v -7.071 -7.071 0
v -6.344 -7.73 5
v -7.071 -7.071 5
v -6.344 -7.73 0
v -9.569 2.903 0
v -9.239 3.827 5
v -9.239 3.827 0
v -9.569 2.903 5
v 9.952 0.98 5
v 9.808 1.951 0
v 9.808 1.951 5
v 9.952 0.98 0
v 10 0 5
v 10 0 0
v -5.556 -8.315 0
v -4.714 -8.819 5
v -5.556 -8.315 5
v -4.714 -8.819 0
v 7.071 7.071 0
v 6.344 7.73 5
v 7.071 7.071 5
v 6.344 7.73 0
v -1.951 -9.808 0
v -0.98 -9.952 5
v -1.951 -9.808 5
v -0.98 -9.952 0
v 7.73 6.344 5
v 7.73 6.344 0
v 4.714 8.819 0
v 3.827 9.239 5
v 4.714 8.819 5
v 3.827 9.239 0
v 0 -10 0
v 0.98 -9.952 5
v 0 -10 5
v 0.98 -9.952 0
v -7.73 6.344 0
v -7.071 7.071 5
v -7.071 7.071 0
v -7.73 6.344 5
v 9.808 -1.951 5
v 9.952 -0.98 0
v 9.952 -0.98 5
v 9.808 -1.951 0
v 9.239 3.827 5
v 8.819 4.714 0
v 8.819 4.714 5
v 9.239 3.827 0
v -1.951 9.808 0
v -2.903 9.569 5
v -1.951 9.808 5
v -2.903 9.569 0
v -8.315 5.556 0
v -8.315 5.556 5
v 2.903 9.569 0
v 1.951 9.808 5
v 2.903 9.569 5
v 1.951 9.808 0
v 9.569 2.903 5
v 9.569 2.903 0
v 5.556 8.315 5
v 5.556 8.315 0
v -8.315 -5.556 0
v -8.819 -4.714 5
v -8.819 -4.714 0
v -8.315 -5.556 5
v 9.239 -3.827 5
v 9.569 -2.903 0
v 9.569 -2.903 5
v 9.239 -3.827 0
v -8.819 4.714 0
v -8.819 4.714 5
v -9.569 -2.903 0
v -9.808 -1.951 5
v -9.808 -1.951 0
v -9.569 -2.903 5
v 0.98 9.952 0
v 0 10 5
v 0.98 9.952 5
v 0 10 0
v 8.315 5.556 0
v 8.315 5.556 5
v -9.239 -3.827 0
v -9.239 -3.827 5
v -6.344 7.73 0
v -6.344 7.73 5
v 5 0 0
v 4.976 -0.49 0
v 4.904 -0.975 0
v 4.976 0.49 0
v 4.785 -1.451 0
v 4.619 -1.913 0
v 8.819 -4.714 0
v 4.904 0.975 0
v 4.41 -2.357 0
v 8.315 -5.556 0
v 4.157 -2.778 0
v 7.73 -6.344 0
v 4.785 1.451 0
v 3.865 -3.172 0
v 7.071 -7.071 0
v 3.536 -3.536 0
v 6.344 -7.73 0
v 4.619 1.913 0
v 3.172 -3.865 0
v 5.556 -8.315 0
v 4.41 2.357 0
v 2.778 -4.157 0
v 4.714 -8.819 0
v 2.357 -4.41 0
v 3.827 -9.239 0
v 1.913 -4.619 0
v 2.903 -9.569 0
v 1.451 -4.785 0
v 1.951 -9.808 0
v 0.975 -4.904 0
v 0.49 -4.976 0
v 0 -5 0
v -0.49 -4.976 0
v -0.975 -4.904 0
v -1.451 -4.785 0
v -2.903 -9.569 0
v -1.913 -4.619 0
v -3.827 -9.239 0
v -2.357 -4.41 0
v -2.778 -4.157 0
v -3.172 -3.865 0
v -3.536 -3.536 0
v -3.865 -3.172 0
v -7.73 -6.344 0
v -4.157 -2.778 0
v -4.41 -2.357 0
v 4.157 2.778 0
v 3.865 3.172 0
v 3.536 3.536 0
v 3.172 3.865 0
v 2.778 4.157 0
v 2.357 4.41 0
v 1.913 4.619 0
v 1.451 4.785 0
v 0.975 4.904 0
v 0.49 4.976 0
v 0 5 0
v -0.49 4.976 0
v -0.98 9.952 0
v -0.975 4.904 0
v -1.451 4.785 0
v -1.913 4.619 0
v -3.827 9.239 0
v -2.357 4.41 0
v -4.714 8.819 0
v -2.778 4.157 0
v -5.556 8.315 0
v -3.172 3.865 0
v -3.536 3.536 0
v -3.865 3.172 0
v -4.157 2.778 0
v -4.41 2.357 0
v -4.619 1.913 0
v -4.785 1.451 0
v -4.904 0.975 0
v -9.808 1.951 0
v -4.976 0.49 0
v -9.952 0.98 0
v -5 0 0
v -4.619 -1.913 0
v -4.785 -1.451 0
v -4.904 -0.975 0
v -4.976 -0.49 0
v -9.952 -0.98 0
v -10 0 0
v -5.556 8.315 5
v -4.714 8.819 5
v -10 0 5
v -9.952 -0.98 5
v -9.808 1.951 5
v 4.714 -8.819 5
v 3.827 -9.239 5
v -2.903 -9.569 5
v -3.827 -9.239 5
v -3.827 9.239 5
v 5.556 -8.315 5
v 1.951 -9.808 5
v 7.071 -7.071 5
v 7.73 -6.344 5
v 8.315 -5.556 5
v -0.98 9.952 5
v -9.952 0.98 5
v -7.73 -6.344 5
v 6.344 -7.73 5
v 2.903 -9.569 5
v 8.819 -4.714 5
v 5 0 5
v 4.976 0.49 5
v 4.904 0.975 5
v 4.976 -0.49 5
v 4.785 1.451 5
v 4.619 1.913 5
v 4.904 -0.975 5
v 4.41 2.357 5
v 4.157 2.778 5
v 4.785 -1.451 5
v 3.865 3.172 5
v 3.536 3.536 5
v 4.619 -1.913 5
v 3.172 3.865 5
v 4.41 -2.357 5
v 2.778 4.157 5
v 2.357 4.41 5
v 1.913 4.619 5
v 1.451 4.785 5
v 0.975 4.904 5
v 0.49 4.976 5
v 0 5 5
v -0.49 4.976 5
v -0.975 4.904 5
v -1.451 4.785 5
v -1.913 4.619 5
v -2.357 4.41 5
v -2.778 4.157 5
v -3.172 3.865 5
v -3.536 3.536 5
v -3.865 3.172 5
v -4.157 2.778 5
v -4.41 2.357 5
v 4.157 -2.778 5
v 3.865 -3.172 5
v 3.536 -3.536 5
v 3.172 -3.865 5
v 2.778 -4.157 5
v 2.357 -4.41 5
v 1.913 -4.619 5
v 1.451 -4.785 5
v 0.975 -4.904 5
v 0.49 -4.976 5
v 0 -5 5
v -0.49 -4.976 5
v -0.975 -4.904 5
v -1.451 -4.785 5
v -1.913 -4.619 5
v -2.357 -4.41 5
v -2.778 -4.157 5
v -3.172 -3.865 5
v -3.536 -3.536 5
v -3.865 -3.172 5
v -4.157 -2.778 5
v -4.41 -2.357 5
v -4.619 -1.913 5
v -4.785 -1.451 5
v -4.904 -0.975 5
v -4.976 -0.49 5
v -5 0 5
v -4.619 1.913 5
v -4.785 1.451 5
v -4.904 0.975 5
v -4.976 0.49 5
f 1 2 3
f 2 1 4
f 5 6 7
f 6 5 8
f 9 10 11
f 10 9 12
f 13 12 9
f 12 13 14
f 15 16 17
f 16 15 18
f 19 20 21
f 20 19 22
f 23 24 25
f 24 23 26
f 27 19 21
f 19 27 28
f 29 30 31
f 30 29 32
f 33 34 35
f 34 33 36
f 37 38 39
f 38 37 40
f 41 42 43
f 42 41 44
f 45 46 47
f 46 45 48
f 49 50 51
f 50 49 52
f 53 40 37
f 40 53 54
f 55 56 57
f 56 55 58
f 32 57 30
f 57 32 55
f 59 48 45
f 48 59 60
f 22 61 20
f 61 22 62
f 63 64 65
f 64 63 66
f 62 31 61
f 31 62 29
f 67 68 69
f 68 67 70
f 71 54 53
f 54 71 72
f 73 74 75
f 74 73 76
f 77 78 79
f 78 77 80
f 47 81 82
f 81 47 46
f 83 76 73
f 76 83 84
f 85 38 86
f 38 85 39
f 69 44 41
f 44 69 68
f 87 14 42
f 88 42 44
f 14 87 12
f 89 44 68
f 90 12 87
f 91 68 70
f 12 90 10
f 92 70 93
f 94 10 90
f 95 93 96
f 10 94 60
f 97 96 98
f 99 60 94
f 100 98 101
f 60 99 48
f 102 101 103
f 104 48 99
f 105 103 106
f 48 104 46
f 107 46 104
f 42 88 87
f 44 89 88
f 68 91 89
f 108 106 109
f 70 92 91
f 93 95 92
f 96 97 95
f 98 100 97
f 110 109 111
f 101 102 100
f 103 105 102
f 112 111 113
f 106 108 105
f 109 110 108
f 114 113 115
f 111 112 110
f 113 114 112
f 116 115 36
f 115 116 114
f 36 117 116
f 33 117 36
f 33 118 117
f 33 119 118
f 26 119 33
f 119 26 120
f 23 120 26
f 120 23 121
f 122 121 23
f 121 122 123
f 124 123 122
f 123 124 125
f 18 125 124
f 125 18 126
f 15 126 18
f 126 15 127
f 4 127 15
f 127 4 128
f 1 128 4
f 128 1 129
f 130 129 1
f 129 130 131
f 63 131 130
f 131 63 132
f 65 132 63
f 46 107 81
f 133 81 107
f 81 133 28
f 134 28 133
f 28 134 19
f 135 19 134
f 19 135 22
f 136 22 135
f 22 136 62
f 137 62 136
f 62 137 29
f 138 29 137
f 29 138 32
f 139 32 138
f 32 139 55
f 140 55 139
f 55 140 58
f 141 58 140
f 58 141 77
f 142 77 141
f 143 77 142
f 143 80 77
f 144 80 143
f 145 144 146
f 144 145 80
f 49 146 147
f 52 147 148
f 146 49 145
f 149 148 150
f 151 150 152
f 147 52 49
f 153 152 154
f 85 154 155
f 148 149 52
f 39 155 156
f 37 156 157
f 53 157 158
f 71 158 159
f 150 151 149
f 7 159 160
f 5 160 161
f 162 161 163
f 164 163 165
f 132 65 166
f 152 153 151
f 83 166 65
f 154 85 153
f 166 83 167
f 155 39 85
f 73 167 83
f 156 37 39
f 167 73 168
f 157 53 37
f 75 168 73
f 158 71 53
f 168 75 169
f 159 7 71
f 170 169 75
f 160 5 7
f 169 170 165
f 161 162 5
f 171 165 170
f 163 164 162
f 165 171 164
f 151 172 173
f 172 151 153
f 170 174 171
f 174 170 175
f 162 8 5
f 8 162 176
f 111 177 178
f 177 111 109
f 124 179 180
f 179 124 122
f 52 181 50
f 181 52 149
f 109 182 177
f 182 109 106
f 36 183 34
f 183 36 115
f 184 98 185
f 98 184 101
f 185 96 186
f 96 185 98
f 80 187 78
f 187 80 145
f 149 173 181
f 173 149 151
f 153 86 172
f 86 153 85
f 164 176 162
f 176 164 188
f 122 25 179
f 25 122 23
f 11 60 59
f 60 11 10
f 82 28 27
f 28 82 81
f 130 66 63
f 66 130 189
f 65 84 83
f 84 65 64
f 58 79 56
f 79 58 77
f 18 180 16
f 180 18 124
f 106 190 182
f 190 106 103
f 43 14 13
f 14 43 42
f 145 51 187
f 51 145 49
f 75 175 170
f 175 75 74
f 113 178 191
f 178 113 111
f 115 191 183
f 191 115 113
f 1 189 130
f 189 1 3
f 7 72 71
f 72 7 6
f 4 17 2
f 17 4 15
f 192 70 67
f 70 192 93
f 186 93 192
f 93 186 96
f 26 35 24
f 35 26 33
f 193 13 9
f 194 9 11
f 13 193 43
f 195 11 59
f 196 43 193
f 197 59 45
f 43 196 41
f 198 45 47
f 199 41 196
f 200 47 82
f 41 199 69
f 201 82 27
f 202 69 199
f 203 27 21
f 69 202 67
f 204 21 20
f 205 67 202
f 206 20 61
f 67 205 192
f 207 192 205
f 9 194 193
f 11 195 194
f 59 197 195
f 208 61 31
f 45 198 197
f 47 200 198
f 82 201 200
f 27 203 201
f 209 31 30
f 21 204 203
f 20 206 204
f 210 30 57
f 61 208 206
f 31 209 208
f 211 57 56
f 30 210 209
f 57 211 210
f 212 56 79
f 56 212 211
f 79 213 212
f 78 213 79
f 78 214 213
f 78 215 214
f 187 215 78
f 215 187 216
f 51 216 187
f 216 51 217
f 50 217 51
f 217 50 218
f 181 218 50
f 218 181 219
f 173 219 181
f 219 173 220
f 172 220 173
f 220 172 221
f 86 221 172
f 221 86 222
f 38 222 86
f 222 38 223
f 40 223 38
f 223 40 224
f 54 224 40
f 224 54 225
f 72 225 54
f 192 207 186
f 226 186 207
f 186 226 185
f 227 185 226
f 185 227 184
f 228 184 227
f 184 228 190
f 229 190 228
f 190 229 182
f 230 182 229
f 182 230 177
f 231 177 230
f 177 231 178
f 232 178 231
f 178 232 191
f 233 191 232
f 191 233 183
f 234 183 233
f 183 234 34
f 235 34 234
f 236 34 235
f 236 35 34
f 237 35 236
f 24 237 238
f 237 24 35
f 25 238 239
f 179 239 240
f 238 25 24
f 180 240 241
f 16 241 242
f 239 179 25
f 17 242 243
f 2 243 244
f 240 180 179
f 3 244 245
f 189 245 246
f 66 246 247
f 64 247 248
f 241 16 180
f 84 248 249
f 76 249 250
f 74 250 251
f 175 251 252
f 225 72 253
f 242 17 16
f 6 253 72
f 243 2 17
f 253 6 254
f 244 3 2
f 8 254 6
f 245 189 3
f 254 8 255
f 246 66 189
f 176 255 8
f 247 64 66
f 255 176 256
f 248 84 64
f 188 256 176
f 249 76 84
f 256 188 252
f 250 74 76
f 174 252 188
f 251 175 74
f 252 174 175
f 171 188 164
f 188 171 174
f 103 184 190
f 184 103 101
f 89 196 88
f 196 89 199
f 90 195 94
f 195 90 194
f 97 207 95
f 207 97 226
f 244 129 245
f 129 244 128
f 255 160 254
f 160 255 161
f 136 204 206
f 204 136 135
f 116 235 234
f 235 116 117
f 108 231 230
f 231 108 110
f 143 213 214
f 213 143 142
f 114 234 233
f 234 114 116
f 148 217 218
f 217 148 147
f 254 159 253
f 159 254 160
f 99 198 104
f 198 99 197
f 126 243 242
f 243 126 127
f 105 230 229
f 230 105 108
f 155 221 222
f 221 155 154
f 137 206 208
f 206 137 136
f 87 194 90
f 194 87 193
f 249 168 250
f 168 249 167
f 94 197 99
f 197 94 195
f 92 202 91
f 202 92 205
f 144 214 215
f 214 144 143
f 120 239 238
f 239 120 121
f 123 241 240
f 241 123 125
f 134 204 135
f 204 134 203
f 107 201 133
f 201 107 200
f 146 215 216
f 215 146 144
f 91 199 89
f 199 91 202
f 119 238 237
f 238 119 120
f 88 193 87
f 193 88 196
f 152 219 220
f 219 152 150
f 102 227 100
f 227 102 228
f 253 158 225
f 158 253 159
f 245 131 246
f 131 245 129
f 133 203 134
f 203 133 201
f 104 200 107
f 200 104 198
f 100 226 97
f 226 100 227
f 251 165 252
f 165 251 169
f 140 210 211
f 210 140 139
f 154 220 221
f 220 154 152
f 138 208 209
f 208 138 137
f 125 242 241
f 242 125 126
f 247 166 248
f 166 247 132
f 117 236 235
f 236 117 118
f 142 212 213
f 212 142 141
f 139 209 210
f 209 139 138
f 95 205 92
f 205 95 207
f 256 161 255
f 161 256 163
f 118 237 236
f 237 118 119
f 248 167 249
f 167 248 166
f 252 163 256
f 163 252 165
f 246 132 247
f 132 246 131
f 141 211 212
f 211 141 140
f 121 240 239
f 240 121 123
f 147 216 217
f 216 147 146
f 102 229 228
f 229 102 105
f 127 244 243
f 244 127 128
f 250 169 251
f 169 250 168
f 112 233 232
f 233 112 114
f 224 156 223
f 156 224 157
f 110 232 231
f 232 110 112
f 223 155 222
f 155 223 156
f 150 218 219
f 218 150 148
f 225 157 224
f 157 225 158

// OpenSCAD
module radial_encoder_magnet() {
    difference() {
        cylinder(h=5, r=10, $fn=64);
        cylinder(h=5, r=5, $fn=64);
    }
}

radial_encoder_magnet();
